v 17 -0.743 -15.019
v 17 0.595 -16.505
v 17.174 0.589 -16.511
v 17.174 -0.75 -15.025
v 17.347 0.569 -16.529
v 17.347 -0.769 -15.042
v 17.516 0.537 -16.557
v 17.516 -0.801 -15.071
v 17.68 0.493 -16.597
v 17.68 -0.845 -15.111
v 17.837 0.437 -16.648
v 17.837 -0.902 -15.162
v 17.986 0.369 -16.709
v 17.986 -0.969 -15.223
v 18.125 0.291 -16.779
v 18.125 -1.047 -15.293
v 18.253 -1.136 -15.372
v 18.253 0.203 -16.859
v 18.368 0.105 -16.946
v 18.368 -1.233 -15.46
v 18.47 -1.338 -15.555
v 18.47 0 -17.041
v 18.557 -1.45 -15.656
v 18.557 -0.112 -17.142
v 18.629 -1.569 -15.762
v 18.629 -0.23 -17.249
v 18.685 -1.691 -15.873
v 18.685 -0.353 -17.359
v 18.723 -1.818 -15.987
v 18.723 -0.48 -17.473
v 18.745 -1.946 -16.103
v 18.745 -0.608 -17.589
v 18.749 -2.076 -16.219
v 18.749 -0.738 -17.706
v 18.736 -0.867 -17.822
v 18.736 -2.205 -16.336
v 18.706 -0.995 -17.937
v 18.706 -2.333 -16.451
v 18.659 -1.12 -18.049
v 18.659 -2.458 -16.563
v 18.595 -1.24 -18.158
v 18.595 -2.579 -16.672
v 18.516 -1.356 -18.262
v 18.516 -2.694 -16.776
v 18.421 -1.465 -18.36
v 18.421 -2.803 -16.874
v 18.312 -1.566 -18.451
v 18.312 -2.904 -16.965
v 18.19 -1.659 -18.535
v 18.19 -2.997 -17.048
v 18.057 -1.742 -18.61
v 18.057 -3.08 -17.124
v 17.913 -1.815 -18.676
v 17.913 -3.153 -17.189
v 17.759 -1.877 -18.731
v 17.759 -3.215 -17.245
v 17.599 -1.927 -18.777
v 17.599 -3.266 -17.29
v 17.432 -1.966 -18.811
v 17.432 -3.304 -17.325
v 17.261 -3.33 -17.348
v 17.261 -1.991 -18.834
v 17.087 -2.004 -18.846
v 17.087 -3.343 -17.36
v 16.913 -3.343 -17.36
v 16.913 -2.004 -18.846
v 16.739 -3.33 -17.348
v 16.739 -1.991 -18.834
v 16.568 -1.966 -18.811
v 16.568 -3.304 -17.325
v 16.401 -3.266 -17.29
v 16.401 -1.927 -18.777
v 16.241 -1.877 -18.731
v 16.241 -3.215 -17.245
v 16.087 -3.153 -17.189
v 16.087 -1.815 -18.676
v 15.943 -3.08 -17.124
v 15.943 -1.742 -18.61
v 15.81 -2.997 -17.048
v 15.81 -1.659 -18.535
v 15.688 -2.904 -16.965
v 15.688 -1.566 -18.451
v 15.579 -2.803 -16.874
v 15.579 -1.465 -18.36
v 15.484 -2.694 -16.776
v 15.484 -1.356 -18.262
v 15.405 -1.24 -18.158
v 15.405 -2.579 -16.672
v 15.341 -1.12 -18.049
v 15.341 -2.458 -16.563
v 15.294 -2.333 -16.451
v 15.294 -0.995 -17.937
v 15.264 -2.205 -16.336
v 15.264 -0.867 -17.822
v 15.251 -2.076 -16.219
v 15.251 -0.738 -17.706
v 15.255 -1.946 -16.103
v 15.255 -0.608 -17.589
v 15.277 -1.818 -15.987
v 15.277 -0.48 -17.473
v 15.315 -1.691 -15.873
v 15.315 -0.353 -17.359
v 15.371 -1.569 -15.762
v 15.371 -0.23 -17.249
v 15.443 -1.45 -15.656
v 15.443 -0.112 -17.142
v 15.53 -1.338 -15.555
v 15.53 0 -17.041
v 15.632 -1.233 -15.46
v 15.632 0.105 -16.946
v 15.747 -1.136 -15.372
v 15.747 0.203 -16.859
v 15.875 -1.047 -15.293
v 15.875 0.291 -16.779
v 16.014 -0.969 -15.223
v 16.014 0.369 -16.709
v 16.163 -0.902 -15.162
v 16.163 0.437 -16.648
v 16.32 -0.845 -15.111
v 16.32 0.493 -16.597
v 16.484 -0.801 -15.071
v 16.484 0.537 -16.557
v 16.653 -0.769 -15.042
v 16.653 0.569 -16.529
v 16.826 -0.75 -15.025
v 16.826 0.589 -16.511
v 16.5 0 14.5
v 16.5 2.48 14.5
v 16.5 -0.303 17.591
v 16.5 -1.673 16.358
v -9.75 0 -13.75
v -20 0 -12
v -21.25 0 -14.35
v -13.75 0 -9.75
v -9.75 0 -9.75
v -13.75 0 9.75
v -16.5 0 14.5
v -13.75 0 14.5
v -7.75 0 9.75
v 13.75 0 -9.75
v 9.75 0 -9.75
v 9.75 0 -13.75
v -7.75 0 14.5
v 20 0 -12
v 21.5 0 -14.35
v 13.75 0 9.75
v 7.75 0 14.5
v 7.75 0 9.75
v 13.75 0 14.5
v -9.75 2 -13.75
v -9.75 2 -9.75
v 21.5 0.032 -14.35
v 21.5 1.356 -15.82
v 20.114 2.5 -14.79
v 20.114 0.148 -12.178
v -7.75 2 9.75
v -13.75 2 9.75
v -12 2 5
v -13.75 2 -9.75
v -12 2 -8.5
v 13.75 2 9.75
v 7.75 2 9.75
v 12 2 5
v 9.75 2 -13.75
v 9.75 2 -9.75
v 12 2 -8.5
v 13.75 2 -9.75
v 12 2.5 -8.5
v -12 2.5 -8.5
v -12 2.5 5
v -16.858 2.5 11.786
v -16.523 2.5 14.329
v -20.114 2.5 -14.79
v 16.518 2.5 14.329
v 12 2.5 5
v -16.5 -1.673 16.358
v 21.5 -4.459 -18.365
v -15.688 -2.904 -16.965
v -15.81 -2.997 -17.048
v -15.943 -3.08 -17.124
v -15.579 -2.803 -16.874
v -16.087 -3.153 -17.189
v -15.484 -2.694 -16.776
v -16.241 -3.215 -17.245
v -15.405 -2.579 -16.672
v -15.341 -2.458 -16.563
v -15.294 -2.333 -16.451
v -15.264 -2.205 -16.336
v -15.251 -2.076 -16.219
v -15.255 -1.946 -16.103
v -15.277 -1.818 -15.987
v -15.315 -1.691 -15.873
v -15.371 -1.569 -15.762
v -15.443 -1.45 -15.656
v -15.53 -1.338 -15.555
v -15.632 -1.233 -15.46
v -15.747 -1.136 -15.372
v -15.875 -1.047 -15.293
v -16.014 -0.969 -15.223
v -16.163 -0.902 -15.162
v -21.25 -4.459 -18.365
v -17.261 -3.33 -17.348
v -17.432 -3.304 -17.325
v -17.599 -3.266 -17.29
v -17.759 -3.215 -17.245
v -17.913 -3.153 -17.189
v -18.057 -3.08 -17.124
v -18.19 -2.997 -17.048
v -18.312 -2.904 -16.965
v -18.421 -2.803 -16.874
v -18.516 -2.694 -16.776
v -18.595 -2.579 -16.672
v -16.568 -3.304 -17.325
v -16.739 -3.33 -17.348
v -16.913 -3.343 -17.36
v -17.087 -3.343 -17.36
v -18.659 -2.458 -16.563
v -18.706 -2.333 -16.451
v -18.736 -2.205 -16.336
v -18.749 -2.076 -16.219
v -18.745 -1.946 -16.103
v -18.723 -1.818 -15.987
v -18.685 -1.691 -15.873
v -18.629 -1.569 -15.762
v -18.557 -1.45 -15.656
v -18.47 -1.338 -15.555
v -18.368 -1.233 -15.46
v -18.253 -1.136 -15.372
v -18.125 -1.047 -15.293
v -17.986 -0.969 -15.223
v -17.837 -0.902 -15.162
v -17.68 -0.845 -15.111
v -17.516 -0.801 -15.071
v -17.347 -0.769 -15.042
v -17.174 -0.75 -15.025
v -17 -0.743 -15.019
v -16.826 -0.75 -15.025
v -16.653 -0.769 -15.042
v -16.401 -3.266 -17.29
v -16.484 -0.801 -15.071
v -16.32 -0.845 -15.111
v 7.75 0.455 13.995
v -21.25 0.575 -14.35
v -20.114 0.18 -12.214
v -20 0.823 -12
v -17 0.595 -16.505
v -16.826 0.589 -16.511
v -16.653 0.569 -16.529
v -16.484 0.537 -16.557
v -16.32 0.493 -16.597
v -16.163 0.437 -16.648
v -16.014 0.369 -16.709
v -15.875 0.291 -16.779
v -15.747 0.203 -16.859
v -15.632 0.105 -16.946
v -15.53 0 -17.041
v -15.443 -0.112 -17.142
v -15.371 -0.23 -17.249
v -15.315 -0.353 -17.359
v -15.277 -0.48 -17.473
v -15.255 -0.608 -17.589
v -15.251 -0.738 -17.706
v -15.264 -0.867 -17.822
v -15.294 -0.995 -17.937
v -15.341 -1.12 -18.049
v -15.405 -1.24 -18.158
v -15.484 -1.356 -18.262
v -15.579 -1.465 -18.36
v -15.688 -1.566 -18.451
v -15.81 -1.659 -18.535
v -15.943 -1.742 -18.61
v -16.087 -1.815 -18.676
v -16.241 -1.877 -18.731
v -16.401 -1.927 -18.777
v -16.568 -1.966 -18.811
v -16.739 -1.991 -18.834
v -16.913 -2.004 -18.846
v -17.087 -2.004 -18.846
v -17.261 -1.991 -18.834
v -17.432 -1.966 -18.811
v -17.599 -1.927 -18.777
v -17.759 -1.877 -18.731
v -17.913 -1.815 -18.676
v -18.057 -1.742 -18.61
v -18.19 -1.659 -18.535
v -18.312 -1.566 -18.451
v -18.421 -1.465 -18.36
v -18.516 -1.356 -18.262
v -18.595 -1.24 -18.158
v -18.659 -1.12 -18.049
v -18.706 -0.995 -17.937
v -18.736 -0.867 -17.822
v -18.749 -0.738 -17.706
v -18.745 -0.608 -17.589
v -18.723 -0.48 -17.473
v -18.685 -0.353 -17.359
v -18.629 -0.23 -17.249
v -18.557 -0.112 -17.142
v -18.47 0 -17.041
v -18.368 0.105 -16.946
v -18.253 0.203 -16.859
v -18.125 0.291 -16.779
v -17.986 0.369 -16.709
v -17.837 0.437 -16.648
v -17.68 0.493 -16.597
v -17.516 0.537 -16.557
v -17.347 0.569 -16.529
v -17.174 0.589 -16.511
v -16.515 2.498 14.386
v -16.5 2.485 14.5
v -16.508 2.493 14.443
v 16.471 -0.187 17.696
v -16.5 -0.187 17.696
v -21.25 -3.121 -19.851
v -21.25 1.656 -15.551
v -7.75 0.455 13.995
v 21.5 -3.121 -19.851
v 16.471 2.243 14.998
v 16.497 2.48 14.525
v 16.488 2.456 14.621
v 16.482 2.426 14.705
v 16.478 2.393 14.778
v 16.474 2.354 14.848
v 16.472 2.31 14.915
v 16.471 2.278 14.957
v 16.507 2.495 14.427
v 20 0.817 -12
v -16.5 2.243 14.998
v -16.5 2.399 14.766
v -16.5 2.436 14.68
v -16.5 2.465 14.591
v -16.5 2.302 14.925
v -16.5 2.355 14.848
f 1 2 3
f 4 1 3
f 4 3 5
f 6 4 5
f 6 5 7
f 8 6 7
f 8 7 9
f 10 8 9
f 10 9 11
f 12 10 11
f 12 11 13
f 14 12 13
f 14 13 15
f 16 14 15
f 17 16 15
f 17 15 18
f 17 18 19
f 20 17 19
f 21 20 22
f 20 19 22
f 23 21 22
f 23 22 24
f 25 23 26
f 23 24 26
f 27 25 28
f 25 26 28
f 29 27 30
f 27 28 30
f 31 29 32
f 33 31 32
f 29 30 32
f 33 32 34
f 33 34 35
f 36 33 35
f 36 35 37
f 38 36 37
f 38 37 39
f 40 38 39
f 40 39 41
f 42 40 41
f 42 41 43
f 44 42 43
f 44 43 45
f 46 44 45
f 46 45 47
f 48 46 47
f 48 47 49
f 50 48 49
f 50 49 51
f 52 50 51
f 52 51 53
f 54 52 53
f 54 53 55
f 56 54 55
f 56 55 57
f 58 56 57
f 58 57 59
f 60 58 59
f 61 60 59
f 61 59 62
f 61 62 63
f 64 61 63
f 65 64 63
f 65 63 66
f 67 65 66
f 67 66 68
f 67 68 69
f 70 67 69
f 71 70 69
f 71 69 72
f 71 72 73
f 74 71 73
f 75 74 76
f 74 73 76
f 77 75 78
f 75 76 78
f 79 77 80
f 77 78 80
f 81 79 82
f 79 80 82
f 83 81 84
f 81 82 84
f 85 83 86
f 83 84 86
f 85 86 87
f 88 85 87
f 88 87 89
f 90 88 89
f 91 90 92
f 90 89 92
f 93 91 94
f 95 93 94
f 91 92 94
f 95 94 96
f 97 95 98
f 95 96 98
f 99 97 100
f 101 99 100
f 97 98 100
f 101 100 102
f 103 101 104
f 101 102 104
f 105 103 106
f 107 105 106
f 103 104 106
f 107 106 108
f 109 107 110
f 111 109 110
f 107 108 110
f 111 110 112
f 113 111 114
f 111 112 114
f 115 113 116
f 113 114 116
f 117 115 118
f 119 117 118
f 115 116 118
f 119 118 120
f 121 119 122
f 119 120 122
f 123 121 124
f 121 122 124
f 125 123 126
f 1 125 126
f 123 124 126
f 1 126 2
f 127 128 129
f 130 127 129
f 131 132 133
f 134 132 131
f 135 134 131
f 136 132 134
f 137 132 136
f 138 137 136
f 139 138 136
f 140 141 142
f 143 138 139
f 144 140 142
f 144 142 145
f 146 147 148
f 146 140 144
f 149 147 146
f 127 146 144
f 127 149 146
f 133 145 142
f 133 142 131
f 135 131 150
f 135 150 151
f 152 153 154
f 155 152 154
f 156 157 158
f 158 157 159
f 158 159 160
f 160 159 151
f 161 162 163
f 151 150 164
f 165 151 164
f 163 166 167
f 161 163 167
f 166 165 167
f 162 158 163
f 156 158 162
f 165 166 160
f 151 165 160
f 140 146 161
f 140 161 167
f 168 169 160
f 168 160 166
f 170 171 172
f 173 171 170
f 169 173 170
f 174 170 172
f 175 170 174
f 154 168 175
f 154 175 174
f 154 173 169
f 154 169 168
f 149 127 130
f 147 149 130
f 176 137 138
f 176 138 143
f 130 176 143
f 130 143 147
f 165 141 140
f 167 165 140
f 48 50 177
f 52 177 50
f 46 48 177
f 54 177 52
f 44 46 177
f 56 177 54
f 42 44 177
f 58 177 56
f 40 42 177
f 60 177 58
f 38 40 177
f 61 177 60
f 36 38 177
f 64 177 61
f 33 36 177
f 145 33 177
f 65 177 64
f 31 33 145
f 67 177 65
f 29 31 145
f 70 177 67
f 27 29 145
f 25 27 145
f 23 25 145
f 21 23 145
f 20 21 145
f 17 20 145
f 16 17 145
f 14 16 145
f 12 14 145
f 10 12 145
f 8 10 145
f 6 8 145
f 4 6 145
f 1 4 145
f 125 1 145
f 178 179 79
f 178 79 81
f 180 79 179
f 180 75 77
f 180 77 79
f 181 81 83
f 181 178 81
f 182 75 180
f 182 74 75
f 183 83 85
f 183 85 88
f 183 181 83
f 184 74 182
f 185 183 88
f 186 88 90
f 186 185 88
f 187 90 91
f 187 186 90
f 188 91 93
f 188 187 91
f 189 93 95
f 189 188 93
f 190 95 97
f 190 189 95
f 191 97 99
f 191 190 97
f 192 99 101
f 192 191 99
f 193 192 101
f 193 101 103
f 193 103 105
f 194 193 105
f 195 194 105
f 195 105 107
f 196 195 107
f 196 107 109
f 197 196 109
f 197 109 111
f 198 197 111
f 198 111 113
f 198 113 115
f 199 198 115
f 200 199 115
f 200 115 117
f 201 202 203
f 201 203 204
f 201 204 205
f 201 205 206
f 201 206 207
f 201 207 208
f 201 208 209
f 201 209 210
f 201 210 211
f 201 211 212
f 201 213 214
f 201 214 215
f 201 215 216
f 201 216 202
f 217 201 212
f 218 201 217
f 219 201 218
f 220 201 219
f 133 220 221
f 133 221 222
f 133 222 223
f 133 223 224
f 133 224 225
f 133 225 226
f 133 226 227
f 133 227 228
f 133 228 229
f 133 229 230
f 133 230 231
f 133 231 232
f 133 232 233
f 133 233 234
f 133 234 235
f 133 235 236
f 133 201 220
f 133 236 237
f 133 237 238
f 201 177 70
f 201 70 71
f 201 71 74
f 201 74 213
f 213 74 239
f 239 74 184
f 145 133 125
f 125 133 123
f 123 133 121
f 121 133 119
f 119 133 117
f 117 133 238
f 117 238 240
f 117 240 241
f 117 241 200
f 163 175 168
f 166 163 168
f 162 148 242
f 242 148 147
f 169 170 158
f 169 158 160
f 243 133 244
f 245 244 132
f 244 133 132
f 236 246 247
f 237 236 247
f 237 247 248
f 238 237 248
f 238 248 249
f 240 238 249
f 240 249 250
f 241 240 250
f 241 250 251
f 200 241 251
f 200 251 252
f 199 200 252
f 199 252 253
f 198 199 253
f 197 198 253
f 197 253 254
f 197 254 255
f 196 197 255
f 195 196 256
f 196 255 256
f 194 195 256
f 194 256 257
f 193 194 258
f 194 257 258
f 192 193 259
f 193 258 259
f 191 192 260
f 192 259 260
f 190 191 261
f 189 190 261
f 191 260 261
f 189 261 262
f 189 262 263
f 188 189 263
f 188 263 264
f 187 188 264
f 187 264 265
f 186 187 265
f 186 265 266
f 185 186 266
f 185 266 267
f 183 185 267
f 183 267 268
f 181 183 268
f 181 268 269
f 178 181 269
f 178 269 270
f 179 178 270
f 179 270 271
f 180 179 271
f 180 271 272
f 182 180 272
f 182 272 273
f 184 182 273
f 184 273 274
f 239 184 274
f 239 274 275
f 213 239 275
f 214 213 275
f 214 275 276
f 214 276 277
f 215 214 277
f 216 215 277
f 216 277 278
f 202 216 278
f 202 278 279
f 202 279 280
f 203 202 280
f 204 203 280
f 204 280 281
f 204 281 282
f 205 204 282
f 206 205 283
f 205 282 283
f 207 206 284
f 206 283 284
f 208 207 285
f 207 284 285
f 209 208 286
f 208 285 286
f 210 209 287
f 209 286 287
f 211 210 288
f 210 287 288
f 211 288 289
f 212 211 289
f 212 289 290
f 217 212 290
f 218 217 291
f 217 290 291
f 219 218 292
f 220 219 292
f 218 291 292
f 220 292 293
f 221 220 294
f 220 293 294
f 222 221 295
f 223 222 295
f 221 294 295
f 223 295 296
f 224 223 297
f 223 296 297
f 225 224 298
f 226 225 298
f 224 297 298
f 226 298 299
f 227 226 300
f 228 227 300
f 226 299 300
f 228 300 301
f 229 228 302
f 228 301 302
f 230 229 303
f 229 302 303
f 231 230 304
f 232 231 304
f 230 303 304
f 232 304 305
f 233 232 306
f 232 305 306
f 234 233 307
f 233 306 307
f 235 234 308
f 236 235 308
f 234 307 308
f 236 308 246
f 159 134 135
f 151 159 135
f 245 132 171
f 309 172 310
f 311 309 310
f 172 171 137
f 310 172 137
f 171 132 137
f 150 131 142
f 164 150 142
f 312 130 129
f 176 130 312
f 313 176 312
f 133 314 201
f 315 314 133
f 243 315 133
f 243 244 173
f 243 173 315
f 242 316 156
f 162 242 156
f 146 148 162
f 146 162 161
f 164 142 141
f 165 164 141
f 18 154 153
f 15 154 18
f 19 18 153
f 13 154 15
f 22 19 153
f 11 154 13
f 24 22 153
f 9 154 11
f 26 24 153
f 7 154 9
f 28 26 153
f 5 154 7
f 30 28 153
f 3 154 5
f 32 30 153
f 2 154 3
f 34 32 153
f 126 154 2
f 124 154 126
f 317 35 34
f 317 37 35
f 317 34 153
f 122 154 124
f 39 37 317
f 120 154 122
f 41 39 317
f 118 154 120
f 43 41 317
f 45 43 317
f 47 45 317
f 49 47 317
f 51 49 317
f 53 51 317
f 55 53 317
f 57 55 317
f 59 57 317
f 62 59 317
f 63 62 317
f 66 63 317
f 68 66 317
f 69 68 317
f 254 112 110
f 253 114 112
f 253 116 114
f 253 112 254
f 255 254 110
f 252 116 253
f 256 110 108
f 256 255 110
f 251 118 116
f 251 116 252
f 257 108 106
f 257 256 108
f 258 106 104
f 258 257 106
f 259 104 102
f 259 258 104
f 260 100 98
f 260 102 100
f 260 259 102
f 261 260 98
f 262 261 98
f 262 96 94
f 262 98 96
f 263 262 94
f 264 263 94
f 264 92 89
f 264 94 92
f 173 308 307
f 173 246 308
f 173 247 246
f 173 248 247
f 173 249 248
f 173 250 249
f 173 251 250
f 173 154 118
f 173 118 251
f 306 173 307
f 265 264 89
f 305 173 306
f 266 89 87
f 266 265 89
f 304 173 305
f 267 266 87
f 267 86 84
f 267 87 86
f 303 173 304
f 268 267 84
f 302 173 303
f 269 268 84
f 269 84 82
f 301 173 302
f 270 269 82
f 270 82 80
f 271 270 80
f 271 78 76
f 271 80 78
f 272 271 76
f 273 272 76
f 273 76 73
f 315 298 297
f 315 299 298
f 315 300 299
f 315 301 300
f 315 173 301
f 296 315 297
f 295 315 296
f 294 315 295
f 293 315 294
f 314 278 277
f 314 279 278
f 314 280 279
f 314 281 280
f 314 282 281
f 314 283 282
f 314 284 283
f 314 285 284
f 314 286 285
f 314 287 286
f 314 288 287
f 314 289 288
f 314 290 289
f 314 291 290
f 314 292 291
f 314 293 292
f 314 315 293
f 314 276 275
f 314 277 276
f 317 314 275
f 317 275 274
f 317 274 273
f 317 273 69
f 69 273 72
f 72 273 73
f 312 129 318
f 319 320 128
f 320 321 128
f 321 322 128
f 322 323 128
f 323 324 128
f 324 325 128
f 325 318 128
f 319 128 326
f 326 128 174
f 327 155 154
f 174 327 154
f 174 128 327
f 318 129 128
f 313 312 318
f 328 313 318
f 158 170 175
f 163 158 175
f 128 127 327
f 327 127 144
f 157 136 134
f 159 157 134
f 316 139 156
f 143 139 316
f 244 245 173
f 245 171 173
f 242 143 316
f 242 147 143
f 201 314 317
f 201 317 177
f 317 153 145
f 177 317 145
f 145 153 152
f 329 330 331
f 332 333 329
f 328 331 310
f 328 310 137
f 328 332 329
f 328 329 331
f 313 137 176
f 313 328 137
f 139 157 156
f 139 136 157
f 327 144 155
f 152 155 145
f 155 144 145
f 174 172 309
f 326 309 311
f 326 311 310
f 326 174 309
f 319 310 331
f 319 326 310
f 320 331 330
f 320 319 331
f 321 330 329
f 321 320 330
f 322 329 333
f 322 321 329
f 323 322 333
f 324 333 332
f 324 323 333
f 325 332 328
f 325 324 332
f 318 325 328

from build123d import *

# Parameters (mm, degrees)
SKETCH1_W                = 27.5
SKETCH1_H                = 19.5
BOSS_EXTRUDE1_DEPTH      = 2.5
BOSS_EXTRUDE2_DEPTH      = 16.5
BOSS_EXTRUDE2_DEPTH_BACK = 16.5
BOSS_EXTRUDE3_DEPTH      = 21.5
BOSS_EXTRUDE3_DEPTH_BACK = 21.25
CUT_EXTRUDE1_DEPTH       = 37.936693725
SKETCH5_R                = 1.75
CUT_EXTRUDE2_DEPTH       = 37.936693725
CHAMFER1_SIZE            = 5.494954839
CHAMFER1_SIZE_2          = 2
BOSS_EXTRUDE4_REACH      = 31.601
SKETCH6_W                = 6
SKETCH6_H                = 4.75
SKETCH7_W                = 19.5
SKETCH7_H                = 4
CUT_EXTRUDE3_DEPTH       = 2
SKETCH8_W                = 27.5
SKETCH8_H                = 19.5
SKETCH8_W_2              = 24
SKETCH8_H_2              = 13.5
BOSS_EXTRUDE5_DEPTH      = 0.5
FILLET1_R                = 1


with BuildPart() as part:
    # Sketch1 → Boss-Extrude1 (new body)
    with BuildSketch(Plane(origin=(0, 0, 0), x_dir=(1, 0, 0), z_dir=(0, 1, 0))):
        Polygon((-16.5, -14.5), (16.5, -14.5), (20, 12), (21.5, 14.35), (-21.25, 14.35), (-20, 12), align=None)
        Rectangle(SKETCH1_W, SKETCH1_H, mode=Mode.SUBTRACT)
    extrude(amount=BOSS_EXTRUDE1_DEPTH)

    # Sketch2 → Boss-Extrude2 (add, two sides: drawn at the far end of the back side and taken through both)
    with BuildSketch(Plane(origin=(0, 0, 0), x_dir=(0, 0, -1), z_dir=(1, 0, 0)).offset(-BOSS_EXTRUDE2_DEPTH_BACK)):
        Polygon((-14.5, 0), (-16.357862064, -1.672826516), (-17.696123276, -0.186536865), (-14.712421813, 2.5), (-14.5, 2.5), align=None)
    extrude(amount=BOSS_EXTRUDE2_DEPTH + BOSS_EXTRUDE2_DEPTH_BACK)

    # Sketch3 → Boss-Extrude3 (add, two sides: drawn at the far end of the back side and taken through both)
    with BuildSketch(Plane(origin=(0, 0, 0), x_dir=(0, 0, -1), z_dir=(1, 0, 0)).offset(-BOSS_EXTRUDE3_DEPTH_BACK)):
        Polygon((14.35, 2.5), (14.790255348, 2.5), (19.851073289, -3.12060774), (18.364783638, -4.458868953), (14.35, 0), align=None)
    extrude(amount=BOSS_EXTRUDE3_DEPTH + BOSS_EXTRUDE3_DEPTH_BACK)

    # Sketch4 → Cut-Extrude1 (cut, through all)
    with BuildSketch(Plane(origin=(0, 8.473955812, -9.411281375), x_dir=(-1, 0, 0), z_dir=(0, 0.6691306063588619, -0.7431448254773909))):
        Polygon((-20.113700783, -8.038750466), (-16.458708787, 11.769448481), (-23.724996003, 11.769448481), (-23.724996003, -12.049500132), align=None)
        Polygon((20.113700783, -8.038750466), (24.708588094, -12.633637777), (20.852277712, 11.769448481), (16.5, 11.702393792), align=None)
    extrude(amount=-CUT_EXTRUDE1_DEPTH, mode=Mode.SUBTRACT)

    # Sketch5 → Cut-Extrude2 (cut, through all)
    with BuildSketch(Plane(origin=(0, 8.473955812, -9.411281375), x_dir=(-1, 0, 0), z_dir=(0, 0.6691306063588619, -0.7431448254773909))):
        with Locations(Location((-17, -12.352024201, 0), (0, 0, 90))):
            Circle(SKETCH5_R)
        with Locations(Location((17, -12.352024201, 0), (0, 0, 90))):
            Circle(SKETCH5_R)
    extrude(amount=-CUT_EXTRUDE2_DEPTH, mode=Mode.SUBTRACT)

    # Chamfer1
    # the kernel refuses this chamfer: 5.494954839, 2 mm, written as the material it takes off along each edge
    with BuildSketch(Plane(origin=(13.75, 0, 9.75), x_dir=(0, -0.013184058198645777, 0.9999130865277316), z_dir=(-1, 0, 0))) as chamfer1_piece_1_section:
        Polygon((CHAMFER1_SIZE * 0.999913086511, CHAMFER1_SIZE * 0.0131840581984), (-CHAMFER1_SIZE_2 * 0.0131840581986, CHAMFER1_SIZE_2 * 0.999913086528), (0, 0), align=None)
    chamfer1_piece_1 = extrude(amount=27.5, mode=Mode.PRIVATE)
    chamfer1_piece_1 = split(chamfer1_piece_1, bisect_by=Plane(origin=(0, 1.804468024, 12.49593523), z_dir=(0, -0.7431448254773978, -0.6691306063588544)), keep=Keep.TOP, mode=Mode.PRIVATE)
    add(chamfer1_piece_1, mode=Mode.SUBTRACT)

    # Boss-Extrude4: up to this plane
    boss_extrude4_end = Plane(origin=(0, 0, 15.244954839), z_dir=(0, -0.9396926207859098, -0.3420201433256651))
    # Sketch6 → Boss-Extrude4 (add, up to the surface)
    with BuildSketch(Plane.XZ, mode=Mode.PRIVATE) as boss_extrude4_sk1:
        with Locations((-10.75, 12.125)):
            Rectangle(SKETCH6_W, SKETCH6_H)
    boss_extrude4_tool1 = split(extrude(boss_extrude4_sk1.sketch, amount=-BOSS_EXTRUDE4_REACH, mode=Mode.PRIVATE), bisect_by=boss_extrude4_end, keep=Keep.BOTH, mode=Mode.PRIVATE)
    add(boss_extrude4_tool1.solids().sort_by_distance((-10.75, 0, 12.125))[0])
    # Sketch6 → Boss-Extrude4 (add, up to the surface)
    with BuildSketch(Plane.XZ, mode=Mode.PRIVATE) as boss_extrude4_sk2:
        with Locations((10.75, 12.125)):
            Rectangle(SKETCH6_W, SKETCH6_H)
    boss_extrude4_tool2 = split(extrude(boss_extrude4_sk2.sketch, amount=-BOSS_EXTRUDE4_REACH, mode=Mode.PRIVATE), bisect_by=boss_extrude4_end, keep=Keep.BOTH, mode=Mode.PRIVATE)
    add(boss_extrude4_tool2.solids().sort_by_distance((10.75, 0, 12.125))[0])

    # Sketch7 → Cut-Extrude3 (cut)
    with BuildSketch(Plane.XZ):
        with Locations((0, -11.75)):
            Rectangle(SKETCH7_W, SKETCH7_H)
    extrude(amount=-CUT_EXTRUDE3_DEPTH, mode=Mode.SUBTRACT)

    # Sketch8 → Boss-Extrude5 (add)
    with BuildSketch(Plane(origin=(0, 2.5, 0), x_dir=(1, 0, 0), z_dir=(0, 1, 0))):
        Rectangle(SKETCH8_W, SKETCH8_H)
        with Locations((0, 1.75)):
            Rectangle(SKETCH8_W_2, SKETCH8_H_2, mode=Mode.SUBTRACT)
    extrude(amount=-BOSS_EXTRUDE5_DEPTH)

    # Fillet1
    fillet1_edges = [part.edges().sort_by_distance(p)[0] for p in [
        (-0.01445917, 2.5, 14.712421813),
    ]]
    fillet(fillet1_edges, radius=FILLET1_R)


solid = part.part
